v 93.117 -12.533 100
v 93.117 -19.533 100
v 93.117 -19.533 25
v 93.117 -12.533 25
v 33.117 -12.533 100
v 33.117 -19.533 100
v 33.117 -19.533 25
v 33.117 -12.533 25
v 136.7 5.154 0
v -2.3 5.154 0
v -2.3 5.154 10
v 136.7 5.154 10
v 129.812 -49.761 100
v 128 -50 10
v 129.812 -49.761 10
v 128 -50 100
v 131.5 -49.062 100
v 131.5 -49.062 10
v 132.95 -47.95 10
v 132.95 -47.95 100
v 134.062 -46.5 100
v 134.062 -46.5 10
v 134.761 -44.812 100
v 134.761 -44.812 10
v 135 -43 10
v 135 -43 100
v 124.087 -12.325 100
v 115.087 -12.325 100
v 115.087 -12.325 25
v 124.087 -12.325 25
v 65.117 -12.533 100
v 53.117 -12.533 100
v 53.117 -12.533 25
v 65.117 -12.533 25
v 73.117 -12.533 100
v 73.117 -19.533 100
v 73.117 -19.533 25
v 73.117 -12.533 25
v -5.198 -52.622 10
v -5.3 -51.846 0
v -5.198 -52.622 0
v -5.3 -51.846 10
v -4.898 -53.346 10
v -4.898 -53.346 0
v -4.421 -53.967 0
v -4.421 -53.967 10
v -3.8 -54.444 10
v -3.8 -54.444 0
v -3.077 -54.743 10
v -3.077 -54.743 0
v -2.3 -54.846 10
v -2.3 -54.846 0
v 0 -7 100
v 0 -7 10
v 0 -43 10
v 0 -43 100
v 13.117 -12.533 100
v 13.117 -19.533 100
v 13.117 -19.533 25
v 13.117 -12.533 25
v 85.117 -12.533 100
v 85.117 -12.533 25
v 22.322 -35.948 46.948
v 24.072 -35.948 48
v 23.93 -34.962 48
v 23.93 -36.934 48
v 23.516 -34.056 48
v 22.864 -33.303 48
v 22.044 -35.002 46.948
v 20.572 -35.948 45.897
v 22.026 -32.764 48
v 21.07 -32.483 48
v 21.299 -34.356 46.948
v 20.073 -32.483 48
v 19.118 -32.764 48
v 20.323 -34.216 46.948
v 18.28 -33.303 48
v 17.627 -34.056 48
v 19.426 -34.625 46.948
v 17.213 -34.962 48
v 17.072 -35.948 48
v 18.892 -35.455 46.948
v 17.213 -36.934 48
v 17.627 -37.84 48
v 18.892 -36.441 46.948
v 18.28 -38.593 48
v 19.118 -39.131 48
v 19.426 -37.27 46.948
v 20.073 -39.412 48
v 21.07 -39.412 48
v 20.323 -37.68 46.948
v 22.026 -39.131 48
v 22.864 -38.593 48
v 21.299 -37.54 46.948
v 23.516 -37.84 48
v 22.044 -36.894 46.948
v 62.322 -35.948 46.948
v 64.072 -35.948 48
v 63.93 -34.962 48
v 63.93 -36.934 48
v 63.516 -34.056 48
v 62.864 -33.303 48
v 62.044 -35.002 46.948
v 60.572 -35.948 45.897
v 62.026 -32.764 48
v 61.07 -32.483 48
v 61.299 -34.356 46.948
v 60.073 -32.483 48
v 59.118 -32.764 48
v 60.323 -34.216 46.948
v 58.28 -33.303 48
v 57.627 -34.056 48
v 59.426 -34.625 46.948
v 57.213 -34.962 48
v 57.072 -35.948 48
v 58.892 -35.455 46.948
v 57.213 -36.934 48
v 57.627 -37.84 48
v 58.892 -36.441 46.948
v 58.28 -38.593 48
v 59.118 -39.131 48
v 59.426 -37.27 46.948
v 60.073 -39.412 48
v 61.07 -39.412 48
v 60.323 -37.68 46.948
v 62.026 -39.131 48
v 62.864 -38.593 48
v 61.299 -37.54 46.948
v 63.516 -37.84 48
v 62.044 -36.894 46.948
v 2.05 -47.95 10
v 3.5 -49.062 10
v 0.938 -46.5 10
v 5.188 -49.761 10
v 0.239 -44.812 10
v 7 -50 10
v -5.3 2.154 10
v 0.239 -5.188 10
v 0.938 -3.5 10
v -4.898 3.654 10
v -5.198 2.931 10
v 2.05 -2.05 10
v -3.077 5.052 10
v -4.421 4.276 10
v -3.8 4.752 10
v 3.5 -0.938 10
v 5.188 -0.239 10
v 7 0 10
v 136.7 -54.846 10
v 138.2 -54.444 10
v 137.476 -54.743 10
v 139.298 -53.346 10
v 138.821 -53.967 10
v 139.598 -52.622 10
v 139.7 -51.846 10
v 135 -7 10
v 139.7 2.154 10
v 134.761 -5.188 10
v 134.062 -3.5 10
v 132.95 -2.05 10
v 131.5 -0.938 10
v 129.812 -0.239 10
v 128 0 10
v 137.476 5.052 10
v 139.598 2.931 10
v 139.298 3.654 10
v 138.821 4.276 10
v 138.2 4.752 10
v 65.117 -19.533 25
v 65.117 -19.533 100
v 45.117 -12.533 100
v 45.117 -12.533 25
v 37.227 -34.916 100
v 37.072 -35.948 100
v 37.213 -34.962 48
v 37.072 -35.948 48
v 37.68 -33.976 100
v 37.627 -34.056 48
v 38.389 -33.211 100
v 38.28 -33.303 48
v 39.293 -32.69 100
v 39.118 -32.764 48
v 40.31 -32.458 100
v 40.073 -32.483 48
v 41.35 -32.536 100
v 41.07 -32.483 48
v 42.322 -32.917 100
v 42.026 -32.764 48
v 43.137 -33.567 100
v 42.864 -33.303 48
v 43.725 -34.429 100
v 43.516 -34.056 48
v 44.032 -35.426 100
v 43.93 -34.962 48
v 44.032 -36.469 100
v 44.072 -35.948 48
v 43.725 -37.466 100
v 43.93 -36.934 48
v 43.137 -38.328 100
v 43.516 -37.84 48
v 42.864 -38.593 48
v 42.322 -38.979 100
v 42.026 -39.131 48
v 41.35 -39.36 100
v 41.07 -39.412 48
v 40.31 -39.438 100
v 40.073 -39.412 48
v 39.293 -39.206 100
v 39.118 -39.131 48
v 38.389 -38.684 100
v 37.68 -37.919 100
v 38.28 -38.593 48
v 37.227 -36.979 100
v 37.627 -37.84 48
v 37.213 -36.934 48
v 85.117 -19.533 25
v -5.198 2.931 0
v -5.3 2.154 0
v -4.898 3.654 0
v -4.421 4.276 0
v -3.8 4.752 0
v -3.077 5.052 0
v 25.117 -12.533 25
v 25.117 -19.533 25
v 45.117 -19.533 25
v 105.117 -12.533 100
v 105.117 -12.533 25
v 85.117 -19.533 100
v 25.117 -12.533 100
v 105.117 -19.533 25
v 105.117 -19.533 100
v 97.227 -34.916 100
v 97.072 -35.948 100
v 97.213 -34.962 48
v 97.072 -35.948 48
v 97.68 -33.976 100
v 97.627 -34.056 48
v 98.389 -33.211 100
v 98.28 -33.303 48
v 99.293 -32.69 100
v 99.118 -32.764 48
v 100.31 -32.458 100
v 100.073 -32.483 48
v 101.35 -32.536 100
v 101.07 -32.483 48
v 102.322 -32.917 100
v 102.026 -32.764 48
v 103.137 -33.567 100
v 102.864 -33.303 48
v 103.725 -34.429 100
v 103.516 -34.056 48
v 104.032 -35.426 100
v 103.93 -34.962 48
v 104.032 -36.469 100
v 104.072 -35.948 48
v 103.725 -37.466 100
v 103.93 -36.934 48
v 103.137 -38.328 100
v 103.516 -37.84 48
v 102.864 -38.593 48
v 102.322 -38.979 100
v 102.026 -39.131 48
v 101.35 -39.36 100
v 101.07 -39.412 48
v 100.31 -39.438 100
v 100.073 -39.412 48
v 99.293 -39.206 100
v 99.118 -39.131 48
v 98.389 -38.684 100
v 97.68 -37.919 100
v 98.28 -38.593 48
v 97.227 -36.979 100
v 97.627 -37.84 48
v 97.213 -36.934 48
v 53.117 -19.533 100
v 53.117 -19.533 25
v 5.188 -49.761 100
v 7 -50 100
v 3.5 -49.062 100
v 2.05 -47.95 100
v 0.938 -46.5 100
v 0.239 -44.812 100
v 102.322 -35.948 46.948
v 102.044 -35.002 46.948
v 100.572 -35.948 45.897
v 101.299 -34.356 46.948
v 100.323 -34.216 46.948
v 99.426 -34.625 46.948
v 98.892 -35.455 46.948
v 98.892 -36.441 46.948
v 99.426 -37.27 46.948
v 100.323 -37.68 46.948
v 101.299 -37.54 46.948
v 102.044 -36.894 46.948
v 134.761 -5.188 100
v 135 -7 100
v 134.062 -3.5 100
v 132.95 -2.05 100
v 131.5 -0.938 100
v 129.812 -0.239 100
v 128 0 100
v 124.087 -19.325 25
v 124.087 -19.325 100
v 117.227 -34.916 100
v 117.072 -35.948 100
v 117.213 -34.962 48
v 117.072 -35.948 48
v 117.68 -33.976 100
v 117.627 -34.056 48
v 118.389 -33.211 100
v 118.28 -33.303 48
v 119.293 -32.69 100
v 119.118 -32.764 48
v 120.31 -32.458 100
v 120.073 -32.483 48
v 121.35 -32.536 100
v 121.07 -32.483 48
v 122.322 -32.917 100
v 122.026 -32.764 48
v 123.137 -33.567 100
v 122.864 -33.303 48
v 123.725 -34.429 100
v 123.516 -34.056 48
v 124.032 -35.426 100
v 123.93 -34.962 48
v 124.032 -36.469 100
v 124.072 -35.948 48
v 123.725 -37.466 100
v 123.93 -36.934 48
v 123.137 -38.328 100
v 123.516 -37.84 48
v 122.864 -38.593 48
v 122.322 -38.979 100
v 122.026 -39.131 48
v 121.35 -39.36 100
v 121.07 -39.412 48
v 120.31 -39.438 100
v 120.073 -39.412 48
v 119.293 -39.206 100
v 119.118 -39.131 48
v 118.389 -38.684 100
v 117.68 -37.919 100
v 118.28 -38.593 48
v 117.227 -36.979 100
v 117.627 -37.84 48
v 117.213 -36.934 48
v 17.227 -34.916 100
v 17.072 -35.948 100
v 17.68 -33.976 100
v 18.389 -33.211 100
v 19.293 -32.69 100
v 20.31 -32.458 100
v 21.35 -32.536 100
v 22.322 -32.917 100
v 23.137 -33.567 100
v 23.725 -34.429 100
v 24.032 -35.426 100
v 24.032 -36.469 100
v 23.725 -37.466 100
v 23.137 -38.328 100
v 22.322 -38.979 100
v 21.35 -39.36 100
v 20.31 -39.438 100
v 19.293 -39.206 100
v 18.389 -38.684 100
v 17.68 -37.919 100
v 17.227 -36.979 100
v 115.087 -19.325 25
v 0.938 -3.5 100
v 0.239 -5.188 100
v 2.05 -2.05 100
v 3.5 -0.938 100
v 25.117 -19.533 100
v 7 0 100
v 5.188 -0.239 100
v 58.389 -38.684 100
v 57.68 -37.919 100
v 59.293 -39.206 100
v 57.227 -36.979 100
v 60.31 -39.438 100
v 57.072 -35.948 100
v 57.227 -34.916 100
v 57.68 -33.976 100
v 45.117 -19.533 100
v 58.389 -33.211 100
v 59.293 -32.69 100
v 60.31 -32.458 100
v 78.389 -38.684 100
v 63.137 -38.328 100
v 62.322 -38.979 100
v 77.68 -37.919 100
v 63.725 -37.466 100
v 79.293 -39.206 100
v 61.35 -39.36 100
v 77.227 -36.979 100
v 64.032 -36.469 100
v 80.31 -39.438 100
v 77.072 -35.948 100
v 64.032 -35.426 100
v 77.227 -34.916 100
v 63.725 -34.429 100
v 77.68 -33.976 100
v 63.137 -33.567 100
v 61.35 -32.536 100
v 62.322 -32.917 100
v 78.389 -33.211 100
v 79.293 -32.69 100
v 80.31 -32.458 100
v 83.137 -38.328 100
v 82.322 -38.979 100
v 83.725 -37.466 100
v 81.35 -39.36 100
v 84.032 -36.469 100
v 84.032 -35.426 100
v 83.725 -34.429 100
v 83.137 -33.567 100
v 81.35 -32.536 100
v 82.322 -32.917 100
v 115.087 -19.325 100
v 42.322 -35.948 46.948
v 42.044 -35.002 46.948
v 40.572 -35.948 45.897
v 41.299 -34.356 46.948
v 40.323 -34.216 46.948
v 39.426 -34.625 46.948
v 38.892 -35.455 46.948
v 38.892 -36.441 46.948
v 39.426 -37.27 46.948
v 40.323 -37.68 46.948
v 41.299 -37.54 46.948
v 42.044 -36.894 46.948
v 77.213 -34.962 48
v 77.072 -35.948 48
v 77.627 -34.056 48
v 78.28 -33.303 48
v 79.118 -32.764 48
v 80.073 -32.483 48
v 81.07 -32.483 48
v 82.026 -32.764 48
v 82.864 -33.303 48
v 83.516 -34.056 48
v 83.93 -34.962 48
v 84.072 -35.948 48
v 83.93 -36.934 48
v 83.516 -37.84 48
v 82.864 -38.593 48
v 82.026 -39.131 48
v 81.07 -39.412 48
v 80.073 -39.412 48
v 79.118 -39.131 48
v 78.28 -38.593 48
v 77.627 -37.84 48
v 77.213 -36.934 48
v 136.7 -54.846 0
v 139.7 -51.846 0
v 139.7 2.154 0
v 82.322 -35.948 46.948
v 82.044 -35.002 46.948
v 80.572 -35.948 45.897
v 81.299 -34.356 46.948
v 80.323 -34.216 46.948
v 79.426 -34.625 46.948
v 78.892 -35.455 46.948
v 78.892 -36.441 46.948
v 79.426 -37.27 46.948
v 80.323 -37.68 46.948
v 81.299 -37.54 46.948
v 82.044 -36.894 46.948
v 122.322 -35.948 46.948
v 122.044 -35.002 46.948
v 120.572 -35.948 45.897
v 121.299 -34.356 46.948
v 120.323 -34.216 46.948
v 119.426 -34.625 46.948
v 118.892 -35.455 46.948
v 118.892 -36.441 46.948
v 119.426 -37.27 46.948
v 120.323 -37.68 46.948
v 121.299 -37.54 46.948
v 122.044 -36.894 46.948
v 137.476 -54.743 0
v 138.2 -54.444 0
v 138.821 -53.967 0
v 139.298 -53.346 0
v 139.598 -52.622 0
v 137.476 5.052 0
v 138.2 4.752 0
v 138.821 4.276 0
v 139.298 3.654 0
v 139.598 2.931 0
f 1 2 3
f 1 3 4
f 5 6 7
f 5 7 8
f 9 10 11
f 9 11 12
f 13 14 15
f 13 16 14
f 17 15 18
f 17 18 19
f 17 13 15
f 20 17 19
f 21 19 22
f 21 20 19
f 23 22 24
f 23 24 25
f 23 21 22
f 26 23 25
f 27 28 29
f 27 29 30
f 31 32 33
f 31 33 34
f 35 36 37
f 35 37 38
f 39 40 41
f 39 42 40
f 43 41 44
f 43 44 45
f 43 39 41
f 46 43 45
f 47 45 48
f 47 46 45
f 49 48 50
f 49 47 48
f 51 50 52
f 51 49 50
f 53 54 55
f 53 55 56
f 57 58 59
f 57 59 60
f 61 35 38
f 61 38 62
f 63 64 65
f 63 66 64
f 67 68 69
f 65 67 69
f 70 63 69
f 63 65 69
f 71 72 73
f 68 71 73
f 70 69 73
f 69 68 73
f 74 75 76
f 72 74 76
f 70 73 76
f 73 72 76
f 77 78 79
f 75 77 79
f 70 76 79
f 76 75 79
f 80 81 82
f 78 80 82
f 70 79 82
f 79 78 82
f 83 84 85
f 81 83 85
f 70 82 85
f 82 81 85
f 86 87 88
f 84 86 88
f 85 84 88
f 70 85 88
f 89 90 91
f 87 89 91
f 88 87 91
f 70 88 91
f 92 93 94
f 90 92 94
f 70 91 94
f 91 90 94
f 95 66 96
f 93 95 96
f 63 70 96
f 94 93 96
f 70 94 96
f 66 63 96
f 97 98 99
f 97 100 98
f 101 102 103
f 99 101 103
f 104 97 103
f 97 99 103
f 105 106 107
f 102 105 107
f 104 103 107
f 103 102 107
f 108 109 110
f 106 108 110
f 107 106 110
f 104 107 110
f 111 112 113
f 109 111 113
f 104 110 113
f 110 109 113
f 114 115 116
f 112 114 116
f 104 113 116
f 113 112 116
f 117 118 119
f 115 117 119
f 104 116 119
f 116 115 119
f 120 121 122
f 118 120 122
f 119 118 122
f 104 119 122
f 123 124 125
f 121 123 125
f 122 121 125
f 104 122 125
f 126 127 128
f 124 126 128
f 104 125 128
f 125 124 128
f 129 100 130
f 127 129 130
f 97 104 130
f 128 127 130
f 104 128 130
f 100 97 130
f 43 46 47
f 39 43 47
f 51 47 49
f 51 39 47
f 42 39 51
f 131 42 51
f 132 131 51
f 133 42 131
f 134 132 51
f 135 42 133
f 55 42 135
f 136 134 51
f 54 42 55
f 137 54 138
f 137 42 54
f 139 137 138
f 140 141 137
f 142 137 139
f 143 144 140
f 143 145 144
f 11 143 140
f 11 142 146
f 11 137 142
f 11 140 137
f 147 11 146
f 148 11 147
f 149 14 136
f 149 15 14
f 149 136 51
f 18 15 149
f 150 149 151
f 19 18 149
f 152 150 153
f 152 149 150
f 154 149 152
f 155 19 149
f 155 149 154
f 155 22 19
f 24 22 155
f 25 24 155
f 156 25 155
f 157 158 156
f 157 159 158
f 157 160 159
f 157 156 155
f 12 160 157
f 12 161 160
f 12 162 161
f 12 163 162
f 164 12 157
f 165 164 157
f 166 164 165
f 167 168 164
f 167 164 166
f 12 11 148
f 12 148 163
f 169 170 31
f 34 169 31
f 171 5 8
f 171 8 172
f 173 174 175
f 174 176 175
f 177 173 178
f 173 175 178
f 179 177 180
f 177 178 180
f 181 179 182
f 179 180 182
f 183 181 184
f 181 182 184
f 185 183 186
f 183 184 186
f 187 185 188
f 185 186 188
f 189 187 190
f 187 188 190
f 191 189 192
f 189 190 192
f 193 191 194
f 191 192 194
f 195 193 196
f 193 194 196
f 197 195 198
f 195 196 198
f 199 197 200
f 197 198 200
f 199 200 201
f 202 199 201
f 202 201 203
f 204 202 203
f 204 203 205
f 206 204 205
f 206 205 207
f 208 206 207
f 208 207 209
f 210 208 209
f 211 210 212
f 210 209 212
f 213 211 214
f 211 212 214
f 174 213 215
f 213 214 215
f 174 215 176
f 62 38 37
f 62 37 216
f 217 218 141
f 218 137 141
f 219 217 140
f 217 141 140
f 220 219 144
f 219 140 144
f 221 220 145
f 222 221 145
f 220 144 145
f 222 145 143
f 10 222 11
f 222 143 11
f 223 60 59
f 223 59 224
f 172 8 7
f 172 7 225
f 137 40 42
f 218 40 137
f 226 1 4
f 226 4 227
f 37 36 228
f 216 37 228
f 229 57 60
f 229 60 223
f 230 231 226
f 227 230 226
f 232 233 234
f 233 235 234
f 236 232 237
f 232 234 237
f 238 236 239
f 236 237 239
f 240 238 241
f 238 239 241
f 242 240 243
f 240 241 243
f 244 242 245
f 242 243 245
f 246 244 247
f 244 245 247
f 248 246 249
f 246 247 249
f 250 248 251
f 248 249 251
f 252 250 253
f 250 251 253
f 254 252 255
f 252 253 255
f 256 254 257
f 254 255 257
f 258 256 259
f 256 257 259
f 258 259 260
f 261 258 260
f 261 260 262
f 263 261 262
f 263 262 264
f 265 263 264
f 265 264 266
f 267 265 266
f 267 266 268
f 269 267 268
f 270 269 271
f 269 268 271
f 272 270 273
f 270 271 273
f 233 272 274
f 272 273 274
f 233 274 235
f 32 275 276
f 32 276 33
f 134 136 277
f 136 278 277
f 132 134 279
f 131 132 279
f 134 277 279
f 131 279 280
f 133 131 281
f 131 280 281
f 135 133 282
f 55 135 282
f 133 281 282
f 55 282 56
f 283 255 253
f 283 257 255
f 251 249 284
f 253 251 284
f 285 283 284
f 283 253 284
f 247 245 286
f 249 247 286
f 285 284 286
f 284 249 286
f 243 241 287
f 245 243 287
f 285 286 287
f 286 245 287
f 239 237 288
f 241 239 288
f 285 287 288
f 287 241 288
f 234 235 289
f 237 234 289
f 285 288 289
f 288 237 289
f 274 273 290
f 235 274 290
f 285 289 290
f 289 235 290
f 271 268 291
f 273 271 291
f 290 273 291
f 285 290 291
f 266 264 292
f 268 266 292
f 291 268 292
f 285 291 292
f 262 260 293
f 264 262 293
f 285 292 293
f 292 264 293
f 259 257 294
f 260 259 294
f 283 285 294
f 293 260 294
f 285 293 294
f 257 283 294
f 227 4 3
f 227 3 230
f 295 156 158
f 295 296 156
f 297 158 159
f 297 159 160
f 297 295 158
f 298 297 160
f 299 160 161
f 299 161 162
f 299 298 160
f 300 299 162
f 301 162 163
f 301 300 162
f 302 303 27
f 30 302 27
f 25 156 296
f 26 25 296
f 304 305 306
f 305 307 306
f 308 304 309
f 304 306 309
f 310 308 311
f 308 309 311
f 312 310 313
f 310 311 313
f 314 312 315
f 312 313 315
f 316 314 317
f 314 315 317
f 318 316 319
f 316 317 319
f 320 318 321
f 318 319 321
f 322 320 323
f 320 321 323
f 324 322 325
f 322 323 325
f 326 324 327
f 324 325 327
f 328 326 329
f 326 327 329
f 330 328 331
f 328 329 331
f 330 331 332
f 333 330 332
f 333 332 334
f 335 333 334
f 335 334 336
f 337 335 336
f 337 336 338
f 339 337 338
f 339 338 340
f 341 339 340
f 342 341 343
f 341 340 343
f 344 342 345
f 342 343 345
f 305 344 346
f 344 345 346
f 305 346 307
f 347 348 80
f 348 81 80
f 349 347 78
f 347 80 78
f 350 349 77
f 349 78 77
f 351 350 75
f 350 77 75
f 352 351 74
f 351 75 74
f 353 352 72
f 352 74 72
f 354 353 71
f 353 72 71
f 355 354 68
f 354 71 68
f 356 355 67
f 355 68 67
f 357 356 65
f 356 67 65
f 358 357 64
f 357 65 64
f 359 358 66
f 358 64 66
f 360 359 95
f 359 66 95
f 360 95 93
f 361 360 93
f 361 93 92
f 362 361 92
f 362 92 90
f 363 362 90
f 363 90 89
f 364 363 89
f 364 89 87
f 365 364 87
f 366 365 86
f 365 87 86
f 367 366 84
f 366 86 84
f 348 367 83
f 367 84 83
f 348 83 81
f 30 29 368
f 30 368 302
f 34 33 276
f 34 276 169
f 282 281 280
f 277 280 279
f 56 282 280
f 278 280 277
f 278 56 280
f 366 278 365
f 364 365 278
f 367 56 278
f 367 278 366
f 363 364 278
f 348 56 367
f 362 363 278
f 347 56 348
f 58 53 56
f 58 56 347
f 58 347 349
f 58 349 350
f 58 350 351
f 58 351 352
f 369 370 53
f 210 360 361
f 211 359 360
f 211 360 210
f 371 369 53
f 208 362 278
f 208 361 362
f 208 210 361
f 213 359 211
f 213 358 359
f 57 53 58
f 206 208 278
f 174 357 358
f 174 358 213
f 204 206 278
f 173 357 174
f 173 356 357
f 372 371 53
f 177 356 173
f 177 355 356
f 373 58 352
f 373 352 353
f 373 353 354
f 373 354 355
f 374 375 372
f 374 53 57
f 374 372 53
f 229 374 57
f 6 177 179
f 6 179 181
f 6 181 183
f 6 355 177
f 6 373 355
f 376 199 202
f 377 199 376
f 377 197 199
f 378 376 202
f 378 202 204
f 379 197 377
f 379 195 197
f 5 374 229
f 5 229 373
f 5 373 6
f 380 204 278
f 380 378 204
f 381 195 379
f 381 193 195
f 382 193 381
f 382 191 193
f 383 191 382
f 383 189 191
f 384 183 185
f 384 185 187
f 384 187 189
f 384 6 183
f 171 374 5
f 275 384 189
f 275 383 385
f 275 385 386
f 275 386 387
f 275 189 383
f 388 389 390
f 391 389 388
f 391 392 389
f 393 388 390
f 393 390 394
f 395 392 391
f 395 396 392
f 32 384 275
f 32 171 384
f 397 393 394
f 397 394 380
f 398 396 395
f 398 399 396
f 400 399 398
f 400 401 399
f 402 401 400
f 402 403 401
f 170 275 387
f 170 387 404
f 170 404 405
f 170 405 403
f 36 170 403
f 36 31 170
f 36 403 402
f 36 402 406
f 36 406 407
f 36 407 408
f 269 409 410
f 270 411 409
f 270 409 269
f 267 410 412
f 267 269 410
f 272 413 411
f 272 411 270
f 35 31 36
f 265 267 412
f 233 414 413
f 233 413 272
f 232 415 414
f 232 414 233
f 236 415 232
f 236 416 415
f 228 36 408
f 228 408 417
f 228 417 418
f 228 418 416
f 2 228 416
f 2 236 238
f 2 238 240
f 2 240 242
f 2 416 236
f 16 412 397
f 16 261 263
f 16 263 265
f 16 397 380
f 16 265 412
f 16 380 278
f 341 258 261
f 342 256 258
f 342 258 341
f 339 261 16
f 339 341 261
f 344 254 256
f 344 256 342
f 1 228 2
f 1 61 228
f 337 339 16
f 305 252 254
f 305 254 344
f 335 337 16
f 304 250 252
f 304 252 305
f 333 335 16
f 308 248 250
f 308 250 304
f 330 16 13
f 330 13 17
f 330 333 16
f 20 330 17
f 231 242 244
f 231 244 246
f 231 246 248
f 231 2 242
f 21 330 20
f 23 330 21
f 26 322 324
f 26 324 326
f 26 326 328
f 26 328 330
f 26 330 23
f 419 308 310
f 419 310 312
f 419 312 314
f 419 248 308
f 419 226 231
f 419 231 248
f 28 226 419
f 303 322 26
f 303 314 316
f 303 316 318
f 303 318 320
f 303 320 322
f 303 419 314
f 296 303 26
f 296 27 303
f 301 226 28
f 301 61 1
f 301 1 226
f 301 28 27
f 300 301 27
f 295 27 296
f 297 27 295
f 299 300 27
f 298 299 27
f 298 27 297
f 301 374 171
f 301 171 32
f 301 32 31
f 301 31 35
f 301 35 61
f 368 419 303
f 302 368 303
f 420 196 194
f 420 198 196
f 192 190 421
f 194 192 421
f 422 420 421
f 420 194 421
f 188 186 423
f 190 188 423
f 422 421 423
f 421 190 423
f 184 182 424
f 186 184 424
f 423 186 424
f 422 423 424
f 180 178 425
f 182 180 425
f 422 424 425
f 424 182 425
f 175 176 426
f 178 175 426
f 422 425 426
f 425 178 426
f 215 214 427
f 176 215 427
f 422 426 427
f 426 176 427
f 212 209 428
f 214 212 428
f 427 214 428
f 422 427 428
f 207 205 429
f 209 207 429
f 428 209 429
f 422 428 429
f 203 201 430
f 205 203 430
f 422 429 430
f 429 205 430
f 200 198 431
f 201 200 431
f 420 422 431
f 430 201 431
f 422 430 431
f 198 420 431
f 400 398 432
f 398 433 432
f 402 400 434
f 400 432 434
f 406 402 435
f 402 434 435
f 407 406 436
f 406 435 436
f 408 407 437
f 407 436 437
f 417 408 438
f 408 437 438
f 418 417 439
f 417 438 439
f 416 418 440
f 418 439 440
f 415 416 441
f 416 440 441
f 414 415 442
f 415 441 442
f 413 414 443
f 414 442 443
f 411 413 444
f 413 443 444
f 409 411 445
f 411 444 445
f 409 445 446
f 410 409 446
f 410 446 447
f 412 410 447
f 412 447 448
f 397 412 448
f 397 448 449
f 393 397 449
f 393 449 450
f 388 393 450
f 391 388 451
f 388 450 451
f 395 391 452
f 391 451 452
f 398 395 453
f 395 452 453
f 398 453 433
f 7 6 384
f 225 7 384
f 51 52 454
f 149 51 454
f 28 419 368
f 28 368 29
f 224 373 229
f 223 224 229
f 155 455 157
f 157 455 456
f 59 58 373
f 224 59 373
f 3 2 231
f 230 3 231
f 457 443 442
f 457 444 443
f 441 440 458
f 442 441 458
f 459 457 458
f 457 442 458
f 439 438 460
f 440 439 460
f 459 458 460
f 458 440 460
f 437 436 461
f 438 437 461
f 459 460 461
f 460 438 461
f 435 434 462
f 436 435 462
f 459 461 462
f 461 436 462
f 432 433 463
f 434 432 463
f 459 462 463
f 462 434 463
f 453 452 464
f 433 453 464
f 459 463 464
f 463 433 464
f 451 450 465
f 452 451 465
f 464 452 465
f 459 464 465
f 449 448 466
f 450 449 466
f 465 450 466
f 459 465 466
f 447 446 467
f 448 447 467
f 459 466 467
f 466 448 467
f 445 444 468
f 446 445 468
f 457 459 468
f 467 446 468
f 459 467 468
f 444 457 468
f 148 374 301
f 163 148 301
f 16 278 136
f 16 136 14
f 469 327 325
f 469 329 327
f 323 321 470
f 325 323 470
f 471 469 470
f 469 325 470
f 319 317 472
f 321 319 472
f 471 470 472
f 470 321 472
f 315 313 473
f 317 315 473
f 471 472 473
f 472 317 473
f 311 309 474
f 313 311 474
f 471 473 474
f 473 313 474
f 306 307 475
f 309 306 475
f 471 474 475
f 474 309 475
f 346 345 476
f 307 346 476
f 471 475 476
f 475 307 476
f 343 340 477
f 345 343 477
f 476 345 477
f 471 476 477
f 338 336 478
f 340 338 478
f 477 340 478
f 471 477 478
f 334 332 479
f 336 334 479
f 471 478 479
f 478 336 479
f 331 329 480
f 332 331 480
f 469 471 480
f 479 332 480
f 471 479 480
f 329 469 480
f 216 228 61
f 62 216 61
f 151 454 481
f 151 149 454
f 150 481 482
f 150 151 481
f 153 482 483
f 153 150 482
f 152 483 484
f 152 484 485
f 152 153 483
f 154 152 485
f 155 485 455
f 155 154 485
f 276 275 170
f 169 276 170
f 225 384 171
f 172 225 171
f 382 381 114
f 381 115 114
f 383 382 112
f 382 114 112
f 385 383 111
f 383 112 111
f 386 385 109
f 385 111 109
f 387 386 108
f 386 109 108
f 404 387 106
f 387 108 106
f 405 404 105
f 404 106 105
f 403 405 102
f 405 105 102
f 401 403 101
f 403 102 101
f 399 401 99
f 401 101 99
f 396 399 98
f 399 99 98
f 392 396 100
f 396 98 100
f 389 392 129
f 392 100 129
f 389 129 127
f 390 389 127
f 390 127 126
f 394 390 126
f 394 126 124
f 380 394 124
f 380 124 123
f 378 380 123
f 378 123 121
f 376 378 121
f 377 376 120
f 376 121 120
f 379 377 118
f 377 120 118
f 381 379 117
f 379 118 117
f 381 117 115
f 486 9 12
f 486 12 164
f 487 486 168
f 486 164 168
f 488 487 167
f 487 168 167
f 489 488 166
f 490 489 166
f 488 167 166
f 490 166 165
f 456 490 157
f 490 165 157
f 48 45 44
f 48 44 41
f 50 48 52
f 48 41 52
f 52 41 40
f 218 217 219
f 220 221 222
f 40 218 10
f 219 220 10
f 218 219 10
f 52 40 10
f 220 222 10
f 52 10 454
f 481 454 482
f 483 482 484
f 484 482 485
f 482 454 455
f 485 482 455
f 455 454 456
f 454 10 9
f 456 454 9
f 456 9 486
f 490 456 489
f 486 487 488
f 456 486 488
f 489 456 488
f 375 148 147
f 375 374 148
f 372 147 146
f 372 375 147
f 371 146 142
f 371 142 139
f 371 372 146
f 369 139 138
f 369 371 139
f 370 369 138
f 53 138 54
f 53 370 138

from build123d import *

# Parameters (mm, degrees)
F0_W     = 135
F0_H     = 100
F1_DEPTH = 50
F2_W     = 12
F2_H     = 7
F2_W_2   = 9
F3_DEPTH = 75
F5_D     = 7
F5_DEPTH = 52
F5_TIP   = 2.1030121666
F6_W     = 145
F6_H     = 60
F7_DEPTH = 10
F8_R     = 7
F9_R     = 3


# Not quite as in the source:
# - a feature names something its author has since deleted; it is built from what else it names


with BuildPart() as f1:
    # F0 (on Front) → F1 (new body)
    with BuildSketch(Plane.XZ):
        with Locations((67.5, 50)):
            Rectangle(F0_W, F0_H)
    extrude(amount=F1_DEPTH)

    # F2 (on face) → F3 (cut)
    with BuildSketch(Plane.XY.offset(100)):
        with Locations((19.1170862466, -16.0328453556)):
            Rectangle(F2_W, F2_H)
        with Locations((39.1170862466, -16.0328453556)):
            Rectangle(F2_W, F2_H)
        with Locations((59.1170862466, -16.0328453556)):
            Rectangle(F2_W, F2_H)
        with Locations((79.1170862466, -16.0328453556)):
            Rectangle(F2_W, F2_H)
        with Locations((99.1170862466, -16.0328453556)):
            Rectangle(F2_W, F2_H)
        with Locations((119.5874011219, -15.8250607699)):
            Rectangle(F2_W_2, F2_H)
    extrude(amount=-F3_DEPTH, mode=Mode.SUBTRACT)

    # F5
    with Locations(Plane.XY.offset(100)):
        with Locations((20.5715699643, -35.9477512538), (40.5715699643, -35.9477512538), (60.5715699643, -35.9477512538), (80.5715699643, -35.9477512538), (100.5715699643, -35.9477512538), (120.5715699643, -35.9477512538)):
            Hole(F5_D / 2, depth=F5_DEPTH)
            with Locations((0, 0, -(F5_DEPTH + F5_TIP / 2))):  # 118° drill point
                Cone(0, F5_D / 2, F5_TIP, mode=Mode.SUBTRACT)

    # F6 (on Top) → F7 (join)
    with BuildSketch(Plane.XY):
        with Locations((67.1998835728, -24.8457092833)):
            Rectangle(F6_W, F6_H)
    extrude(amount=F7_DEPTH)

    # F8
    f8_edges = [f1.edges().sort_by_distance(p)[0] for p in [
        (0, -50, 55),
        (135, -50, 55),
        (135, 0, 55),
        (0, 0, 55),
    ]]
    fillet(f8_edges, radius=F8_R)

    # F9
    f9_edges = [f1.edges().sort_by_distance(p)[0] for p in [
        (-5.300116, 5.154291, 5),
        (-5.300116, -54.845709, 5),
        (139.699884, -54.845709, 5),
        (139.699884, 5.154291, 5),
    ]]
    fillet(f9_edges, radius=F9_R)


solid = f1.part
